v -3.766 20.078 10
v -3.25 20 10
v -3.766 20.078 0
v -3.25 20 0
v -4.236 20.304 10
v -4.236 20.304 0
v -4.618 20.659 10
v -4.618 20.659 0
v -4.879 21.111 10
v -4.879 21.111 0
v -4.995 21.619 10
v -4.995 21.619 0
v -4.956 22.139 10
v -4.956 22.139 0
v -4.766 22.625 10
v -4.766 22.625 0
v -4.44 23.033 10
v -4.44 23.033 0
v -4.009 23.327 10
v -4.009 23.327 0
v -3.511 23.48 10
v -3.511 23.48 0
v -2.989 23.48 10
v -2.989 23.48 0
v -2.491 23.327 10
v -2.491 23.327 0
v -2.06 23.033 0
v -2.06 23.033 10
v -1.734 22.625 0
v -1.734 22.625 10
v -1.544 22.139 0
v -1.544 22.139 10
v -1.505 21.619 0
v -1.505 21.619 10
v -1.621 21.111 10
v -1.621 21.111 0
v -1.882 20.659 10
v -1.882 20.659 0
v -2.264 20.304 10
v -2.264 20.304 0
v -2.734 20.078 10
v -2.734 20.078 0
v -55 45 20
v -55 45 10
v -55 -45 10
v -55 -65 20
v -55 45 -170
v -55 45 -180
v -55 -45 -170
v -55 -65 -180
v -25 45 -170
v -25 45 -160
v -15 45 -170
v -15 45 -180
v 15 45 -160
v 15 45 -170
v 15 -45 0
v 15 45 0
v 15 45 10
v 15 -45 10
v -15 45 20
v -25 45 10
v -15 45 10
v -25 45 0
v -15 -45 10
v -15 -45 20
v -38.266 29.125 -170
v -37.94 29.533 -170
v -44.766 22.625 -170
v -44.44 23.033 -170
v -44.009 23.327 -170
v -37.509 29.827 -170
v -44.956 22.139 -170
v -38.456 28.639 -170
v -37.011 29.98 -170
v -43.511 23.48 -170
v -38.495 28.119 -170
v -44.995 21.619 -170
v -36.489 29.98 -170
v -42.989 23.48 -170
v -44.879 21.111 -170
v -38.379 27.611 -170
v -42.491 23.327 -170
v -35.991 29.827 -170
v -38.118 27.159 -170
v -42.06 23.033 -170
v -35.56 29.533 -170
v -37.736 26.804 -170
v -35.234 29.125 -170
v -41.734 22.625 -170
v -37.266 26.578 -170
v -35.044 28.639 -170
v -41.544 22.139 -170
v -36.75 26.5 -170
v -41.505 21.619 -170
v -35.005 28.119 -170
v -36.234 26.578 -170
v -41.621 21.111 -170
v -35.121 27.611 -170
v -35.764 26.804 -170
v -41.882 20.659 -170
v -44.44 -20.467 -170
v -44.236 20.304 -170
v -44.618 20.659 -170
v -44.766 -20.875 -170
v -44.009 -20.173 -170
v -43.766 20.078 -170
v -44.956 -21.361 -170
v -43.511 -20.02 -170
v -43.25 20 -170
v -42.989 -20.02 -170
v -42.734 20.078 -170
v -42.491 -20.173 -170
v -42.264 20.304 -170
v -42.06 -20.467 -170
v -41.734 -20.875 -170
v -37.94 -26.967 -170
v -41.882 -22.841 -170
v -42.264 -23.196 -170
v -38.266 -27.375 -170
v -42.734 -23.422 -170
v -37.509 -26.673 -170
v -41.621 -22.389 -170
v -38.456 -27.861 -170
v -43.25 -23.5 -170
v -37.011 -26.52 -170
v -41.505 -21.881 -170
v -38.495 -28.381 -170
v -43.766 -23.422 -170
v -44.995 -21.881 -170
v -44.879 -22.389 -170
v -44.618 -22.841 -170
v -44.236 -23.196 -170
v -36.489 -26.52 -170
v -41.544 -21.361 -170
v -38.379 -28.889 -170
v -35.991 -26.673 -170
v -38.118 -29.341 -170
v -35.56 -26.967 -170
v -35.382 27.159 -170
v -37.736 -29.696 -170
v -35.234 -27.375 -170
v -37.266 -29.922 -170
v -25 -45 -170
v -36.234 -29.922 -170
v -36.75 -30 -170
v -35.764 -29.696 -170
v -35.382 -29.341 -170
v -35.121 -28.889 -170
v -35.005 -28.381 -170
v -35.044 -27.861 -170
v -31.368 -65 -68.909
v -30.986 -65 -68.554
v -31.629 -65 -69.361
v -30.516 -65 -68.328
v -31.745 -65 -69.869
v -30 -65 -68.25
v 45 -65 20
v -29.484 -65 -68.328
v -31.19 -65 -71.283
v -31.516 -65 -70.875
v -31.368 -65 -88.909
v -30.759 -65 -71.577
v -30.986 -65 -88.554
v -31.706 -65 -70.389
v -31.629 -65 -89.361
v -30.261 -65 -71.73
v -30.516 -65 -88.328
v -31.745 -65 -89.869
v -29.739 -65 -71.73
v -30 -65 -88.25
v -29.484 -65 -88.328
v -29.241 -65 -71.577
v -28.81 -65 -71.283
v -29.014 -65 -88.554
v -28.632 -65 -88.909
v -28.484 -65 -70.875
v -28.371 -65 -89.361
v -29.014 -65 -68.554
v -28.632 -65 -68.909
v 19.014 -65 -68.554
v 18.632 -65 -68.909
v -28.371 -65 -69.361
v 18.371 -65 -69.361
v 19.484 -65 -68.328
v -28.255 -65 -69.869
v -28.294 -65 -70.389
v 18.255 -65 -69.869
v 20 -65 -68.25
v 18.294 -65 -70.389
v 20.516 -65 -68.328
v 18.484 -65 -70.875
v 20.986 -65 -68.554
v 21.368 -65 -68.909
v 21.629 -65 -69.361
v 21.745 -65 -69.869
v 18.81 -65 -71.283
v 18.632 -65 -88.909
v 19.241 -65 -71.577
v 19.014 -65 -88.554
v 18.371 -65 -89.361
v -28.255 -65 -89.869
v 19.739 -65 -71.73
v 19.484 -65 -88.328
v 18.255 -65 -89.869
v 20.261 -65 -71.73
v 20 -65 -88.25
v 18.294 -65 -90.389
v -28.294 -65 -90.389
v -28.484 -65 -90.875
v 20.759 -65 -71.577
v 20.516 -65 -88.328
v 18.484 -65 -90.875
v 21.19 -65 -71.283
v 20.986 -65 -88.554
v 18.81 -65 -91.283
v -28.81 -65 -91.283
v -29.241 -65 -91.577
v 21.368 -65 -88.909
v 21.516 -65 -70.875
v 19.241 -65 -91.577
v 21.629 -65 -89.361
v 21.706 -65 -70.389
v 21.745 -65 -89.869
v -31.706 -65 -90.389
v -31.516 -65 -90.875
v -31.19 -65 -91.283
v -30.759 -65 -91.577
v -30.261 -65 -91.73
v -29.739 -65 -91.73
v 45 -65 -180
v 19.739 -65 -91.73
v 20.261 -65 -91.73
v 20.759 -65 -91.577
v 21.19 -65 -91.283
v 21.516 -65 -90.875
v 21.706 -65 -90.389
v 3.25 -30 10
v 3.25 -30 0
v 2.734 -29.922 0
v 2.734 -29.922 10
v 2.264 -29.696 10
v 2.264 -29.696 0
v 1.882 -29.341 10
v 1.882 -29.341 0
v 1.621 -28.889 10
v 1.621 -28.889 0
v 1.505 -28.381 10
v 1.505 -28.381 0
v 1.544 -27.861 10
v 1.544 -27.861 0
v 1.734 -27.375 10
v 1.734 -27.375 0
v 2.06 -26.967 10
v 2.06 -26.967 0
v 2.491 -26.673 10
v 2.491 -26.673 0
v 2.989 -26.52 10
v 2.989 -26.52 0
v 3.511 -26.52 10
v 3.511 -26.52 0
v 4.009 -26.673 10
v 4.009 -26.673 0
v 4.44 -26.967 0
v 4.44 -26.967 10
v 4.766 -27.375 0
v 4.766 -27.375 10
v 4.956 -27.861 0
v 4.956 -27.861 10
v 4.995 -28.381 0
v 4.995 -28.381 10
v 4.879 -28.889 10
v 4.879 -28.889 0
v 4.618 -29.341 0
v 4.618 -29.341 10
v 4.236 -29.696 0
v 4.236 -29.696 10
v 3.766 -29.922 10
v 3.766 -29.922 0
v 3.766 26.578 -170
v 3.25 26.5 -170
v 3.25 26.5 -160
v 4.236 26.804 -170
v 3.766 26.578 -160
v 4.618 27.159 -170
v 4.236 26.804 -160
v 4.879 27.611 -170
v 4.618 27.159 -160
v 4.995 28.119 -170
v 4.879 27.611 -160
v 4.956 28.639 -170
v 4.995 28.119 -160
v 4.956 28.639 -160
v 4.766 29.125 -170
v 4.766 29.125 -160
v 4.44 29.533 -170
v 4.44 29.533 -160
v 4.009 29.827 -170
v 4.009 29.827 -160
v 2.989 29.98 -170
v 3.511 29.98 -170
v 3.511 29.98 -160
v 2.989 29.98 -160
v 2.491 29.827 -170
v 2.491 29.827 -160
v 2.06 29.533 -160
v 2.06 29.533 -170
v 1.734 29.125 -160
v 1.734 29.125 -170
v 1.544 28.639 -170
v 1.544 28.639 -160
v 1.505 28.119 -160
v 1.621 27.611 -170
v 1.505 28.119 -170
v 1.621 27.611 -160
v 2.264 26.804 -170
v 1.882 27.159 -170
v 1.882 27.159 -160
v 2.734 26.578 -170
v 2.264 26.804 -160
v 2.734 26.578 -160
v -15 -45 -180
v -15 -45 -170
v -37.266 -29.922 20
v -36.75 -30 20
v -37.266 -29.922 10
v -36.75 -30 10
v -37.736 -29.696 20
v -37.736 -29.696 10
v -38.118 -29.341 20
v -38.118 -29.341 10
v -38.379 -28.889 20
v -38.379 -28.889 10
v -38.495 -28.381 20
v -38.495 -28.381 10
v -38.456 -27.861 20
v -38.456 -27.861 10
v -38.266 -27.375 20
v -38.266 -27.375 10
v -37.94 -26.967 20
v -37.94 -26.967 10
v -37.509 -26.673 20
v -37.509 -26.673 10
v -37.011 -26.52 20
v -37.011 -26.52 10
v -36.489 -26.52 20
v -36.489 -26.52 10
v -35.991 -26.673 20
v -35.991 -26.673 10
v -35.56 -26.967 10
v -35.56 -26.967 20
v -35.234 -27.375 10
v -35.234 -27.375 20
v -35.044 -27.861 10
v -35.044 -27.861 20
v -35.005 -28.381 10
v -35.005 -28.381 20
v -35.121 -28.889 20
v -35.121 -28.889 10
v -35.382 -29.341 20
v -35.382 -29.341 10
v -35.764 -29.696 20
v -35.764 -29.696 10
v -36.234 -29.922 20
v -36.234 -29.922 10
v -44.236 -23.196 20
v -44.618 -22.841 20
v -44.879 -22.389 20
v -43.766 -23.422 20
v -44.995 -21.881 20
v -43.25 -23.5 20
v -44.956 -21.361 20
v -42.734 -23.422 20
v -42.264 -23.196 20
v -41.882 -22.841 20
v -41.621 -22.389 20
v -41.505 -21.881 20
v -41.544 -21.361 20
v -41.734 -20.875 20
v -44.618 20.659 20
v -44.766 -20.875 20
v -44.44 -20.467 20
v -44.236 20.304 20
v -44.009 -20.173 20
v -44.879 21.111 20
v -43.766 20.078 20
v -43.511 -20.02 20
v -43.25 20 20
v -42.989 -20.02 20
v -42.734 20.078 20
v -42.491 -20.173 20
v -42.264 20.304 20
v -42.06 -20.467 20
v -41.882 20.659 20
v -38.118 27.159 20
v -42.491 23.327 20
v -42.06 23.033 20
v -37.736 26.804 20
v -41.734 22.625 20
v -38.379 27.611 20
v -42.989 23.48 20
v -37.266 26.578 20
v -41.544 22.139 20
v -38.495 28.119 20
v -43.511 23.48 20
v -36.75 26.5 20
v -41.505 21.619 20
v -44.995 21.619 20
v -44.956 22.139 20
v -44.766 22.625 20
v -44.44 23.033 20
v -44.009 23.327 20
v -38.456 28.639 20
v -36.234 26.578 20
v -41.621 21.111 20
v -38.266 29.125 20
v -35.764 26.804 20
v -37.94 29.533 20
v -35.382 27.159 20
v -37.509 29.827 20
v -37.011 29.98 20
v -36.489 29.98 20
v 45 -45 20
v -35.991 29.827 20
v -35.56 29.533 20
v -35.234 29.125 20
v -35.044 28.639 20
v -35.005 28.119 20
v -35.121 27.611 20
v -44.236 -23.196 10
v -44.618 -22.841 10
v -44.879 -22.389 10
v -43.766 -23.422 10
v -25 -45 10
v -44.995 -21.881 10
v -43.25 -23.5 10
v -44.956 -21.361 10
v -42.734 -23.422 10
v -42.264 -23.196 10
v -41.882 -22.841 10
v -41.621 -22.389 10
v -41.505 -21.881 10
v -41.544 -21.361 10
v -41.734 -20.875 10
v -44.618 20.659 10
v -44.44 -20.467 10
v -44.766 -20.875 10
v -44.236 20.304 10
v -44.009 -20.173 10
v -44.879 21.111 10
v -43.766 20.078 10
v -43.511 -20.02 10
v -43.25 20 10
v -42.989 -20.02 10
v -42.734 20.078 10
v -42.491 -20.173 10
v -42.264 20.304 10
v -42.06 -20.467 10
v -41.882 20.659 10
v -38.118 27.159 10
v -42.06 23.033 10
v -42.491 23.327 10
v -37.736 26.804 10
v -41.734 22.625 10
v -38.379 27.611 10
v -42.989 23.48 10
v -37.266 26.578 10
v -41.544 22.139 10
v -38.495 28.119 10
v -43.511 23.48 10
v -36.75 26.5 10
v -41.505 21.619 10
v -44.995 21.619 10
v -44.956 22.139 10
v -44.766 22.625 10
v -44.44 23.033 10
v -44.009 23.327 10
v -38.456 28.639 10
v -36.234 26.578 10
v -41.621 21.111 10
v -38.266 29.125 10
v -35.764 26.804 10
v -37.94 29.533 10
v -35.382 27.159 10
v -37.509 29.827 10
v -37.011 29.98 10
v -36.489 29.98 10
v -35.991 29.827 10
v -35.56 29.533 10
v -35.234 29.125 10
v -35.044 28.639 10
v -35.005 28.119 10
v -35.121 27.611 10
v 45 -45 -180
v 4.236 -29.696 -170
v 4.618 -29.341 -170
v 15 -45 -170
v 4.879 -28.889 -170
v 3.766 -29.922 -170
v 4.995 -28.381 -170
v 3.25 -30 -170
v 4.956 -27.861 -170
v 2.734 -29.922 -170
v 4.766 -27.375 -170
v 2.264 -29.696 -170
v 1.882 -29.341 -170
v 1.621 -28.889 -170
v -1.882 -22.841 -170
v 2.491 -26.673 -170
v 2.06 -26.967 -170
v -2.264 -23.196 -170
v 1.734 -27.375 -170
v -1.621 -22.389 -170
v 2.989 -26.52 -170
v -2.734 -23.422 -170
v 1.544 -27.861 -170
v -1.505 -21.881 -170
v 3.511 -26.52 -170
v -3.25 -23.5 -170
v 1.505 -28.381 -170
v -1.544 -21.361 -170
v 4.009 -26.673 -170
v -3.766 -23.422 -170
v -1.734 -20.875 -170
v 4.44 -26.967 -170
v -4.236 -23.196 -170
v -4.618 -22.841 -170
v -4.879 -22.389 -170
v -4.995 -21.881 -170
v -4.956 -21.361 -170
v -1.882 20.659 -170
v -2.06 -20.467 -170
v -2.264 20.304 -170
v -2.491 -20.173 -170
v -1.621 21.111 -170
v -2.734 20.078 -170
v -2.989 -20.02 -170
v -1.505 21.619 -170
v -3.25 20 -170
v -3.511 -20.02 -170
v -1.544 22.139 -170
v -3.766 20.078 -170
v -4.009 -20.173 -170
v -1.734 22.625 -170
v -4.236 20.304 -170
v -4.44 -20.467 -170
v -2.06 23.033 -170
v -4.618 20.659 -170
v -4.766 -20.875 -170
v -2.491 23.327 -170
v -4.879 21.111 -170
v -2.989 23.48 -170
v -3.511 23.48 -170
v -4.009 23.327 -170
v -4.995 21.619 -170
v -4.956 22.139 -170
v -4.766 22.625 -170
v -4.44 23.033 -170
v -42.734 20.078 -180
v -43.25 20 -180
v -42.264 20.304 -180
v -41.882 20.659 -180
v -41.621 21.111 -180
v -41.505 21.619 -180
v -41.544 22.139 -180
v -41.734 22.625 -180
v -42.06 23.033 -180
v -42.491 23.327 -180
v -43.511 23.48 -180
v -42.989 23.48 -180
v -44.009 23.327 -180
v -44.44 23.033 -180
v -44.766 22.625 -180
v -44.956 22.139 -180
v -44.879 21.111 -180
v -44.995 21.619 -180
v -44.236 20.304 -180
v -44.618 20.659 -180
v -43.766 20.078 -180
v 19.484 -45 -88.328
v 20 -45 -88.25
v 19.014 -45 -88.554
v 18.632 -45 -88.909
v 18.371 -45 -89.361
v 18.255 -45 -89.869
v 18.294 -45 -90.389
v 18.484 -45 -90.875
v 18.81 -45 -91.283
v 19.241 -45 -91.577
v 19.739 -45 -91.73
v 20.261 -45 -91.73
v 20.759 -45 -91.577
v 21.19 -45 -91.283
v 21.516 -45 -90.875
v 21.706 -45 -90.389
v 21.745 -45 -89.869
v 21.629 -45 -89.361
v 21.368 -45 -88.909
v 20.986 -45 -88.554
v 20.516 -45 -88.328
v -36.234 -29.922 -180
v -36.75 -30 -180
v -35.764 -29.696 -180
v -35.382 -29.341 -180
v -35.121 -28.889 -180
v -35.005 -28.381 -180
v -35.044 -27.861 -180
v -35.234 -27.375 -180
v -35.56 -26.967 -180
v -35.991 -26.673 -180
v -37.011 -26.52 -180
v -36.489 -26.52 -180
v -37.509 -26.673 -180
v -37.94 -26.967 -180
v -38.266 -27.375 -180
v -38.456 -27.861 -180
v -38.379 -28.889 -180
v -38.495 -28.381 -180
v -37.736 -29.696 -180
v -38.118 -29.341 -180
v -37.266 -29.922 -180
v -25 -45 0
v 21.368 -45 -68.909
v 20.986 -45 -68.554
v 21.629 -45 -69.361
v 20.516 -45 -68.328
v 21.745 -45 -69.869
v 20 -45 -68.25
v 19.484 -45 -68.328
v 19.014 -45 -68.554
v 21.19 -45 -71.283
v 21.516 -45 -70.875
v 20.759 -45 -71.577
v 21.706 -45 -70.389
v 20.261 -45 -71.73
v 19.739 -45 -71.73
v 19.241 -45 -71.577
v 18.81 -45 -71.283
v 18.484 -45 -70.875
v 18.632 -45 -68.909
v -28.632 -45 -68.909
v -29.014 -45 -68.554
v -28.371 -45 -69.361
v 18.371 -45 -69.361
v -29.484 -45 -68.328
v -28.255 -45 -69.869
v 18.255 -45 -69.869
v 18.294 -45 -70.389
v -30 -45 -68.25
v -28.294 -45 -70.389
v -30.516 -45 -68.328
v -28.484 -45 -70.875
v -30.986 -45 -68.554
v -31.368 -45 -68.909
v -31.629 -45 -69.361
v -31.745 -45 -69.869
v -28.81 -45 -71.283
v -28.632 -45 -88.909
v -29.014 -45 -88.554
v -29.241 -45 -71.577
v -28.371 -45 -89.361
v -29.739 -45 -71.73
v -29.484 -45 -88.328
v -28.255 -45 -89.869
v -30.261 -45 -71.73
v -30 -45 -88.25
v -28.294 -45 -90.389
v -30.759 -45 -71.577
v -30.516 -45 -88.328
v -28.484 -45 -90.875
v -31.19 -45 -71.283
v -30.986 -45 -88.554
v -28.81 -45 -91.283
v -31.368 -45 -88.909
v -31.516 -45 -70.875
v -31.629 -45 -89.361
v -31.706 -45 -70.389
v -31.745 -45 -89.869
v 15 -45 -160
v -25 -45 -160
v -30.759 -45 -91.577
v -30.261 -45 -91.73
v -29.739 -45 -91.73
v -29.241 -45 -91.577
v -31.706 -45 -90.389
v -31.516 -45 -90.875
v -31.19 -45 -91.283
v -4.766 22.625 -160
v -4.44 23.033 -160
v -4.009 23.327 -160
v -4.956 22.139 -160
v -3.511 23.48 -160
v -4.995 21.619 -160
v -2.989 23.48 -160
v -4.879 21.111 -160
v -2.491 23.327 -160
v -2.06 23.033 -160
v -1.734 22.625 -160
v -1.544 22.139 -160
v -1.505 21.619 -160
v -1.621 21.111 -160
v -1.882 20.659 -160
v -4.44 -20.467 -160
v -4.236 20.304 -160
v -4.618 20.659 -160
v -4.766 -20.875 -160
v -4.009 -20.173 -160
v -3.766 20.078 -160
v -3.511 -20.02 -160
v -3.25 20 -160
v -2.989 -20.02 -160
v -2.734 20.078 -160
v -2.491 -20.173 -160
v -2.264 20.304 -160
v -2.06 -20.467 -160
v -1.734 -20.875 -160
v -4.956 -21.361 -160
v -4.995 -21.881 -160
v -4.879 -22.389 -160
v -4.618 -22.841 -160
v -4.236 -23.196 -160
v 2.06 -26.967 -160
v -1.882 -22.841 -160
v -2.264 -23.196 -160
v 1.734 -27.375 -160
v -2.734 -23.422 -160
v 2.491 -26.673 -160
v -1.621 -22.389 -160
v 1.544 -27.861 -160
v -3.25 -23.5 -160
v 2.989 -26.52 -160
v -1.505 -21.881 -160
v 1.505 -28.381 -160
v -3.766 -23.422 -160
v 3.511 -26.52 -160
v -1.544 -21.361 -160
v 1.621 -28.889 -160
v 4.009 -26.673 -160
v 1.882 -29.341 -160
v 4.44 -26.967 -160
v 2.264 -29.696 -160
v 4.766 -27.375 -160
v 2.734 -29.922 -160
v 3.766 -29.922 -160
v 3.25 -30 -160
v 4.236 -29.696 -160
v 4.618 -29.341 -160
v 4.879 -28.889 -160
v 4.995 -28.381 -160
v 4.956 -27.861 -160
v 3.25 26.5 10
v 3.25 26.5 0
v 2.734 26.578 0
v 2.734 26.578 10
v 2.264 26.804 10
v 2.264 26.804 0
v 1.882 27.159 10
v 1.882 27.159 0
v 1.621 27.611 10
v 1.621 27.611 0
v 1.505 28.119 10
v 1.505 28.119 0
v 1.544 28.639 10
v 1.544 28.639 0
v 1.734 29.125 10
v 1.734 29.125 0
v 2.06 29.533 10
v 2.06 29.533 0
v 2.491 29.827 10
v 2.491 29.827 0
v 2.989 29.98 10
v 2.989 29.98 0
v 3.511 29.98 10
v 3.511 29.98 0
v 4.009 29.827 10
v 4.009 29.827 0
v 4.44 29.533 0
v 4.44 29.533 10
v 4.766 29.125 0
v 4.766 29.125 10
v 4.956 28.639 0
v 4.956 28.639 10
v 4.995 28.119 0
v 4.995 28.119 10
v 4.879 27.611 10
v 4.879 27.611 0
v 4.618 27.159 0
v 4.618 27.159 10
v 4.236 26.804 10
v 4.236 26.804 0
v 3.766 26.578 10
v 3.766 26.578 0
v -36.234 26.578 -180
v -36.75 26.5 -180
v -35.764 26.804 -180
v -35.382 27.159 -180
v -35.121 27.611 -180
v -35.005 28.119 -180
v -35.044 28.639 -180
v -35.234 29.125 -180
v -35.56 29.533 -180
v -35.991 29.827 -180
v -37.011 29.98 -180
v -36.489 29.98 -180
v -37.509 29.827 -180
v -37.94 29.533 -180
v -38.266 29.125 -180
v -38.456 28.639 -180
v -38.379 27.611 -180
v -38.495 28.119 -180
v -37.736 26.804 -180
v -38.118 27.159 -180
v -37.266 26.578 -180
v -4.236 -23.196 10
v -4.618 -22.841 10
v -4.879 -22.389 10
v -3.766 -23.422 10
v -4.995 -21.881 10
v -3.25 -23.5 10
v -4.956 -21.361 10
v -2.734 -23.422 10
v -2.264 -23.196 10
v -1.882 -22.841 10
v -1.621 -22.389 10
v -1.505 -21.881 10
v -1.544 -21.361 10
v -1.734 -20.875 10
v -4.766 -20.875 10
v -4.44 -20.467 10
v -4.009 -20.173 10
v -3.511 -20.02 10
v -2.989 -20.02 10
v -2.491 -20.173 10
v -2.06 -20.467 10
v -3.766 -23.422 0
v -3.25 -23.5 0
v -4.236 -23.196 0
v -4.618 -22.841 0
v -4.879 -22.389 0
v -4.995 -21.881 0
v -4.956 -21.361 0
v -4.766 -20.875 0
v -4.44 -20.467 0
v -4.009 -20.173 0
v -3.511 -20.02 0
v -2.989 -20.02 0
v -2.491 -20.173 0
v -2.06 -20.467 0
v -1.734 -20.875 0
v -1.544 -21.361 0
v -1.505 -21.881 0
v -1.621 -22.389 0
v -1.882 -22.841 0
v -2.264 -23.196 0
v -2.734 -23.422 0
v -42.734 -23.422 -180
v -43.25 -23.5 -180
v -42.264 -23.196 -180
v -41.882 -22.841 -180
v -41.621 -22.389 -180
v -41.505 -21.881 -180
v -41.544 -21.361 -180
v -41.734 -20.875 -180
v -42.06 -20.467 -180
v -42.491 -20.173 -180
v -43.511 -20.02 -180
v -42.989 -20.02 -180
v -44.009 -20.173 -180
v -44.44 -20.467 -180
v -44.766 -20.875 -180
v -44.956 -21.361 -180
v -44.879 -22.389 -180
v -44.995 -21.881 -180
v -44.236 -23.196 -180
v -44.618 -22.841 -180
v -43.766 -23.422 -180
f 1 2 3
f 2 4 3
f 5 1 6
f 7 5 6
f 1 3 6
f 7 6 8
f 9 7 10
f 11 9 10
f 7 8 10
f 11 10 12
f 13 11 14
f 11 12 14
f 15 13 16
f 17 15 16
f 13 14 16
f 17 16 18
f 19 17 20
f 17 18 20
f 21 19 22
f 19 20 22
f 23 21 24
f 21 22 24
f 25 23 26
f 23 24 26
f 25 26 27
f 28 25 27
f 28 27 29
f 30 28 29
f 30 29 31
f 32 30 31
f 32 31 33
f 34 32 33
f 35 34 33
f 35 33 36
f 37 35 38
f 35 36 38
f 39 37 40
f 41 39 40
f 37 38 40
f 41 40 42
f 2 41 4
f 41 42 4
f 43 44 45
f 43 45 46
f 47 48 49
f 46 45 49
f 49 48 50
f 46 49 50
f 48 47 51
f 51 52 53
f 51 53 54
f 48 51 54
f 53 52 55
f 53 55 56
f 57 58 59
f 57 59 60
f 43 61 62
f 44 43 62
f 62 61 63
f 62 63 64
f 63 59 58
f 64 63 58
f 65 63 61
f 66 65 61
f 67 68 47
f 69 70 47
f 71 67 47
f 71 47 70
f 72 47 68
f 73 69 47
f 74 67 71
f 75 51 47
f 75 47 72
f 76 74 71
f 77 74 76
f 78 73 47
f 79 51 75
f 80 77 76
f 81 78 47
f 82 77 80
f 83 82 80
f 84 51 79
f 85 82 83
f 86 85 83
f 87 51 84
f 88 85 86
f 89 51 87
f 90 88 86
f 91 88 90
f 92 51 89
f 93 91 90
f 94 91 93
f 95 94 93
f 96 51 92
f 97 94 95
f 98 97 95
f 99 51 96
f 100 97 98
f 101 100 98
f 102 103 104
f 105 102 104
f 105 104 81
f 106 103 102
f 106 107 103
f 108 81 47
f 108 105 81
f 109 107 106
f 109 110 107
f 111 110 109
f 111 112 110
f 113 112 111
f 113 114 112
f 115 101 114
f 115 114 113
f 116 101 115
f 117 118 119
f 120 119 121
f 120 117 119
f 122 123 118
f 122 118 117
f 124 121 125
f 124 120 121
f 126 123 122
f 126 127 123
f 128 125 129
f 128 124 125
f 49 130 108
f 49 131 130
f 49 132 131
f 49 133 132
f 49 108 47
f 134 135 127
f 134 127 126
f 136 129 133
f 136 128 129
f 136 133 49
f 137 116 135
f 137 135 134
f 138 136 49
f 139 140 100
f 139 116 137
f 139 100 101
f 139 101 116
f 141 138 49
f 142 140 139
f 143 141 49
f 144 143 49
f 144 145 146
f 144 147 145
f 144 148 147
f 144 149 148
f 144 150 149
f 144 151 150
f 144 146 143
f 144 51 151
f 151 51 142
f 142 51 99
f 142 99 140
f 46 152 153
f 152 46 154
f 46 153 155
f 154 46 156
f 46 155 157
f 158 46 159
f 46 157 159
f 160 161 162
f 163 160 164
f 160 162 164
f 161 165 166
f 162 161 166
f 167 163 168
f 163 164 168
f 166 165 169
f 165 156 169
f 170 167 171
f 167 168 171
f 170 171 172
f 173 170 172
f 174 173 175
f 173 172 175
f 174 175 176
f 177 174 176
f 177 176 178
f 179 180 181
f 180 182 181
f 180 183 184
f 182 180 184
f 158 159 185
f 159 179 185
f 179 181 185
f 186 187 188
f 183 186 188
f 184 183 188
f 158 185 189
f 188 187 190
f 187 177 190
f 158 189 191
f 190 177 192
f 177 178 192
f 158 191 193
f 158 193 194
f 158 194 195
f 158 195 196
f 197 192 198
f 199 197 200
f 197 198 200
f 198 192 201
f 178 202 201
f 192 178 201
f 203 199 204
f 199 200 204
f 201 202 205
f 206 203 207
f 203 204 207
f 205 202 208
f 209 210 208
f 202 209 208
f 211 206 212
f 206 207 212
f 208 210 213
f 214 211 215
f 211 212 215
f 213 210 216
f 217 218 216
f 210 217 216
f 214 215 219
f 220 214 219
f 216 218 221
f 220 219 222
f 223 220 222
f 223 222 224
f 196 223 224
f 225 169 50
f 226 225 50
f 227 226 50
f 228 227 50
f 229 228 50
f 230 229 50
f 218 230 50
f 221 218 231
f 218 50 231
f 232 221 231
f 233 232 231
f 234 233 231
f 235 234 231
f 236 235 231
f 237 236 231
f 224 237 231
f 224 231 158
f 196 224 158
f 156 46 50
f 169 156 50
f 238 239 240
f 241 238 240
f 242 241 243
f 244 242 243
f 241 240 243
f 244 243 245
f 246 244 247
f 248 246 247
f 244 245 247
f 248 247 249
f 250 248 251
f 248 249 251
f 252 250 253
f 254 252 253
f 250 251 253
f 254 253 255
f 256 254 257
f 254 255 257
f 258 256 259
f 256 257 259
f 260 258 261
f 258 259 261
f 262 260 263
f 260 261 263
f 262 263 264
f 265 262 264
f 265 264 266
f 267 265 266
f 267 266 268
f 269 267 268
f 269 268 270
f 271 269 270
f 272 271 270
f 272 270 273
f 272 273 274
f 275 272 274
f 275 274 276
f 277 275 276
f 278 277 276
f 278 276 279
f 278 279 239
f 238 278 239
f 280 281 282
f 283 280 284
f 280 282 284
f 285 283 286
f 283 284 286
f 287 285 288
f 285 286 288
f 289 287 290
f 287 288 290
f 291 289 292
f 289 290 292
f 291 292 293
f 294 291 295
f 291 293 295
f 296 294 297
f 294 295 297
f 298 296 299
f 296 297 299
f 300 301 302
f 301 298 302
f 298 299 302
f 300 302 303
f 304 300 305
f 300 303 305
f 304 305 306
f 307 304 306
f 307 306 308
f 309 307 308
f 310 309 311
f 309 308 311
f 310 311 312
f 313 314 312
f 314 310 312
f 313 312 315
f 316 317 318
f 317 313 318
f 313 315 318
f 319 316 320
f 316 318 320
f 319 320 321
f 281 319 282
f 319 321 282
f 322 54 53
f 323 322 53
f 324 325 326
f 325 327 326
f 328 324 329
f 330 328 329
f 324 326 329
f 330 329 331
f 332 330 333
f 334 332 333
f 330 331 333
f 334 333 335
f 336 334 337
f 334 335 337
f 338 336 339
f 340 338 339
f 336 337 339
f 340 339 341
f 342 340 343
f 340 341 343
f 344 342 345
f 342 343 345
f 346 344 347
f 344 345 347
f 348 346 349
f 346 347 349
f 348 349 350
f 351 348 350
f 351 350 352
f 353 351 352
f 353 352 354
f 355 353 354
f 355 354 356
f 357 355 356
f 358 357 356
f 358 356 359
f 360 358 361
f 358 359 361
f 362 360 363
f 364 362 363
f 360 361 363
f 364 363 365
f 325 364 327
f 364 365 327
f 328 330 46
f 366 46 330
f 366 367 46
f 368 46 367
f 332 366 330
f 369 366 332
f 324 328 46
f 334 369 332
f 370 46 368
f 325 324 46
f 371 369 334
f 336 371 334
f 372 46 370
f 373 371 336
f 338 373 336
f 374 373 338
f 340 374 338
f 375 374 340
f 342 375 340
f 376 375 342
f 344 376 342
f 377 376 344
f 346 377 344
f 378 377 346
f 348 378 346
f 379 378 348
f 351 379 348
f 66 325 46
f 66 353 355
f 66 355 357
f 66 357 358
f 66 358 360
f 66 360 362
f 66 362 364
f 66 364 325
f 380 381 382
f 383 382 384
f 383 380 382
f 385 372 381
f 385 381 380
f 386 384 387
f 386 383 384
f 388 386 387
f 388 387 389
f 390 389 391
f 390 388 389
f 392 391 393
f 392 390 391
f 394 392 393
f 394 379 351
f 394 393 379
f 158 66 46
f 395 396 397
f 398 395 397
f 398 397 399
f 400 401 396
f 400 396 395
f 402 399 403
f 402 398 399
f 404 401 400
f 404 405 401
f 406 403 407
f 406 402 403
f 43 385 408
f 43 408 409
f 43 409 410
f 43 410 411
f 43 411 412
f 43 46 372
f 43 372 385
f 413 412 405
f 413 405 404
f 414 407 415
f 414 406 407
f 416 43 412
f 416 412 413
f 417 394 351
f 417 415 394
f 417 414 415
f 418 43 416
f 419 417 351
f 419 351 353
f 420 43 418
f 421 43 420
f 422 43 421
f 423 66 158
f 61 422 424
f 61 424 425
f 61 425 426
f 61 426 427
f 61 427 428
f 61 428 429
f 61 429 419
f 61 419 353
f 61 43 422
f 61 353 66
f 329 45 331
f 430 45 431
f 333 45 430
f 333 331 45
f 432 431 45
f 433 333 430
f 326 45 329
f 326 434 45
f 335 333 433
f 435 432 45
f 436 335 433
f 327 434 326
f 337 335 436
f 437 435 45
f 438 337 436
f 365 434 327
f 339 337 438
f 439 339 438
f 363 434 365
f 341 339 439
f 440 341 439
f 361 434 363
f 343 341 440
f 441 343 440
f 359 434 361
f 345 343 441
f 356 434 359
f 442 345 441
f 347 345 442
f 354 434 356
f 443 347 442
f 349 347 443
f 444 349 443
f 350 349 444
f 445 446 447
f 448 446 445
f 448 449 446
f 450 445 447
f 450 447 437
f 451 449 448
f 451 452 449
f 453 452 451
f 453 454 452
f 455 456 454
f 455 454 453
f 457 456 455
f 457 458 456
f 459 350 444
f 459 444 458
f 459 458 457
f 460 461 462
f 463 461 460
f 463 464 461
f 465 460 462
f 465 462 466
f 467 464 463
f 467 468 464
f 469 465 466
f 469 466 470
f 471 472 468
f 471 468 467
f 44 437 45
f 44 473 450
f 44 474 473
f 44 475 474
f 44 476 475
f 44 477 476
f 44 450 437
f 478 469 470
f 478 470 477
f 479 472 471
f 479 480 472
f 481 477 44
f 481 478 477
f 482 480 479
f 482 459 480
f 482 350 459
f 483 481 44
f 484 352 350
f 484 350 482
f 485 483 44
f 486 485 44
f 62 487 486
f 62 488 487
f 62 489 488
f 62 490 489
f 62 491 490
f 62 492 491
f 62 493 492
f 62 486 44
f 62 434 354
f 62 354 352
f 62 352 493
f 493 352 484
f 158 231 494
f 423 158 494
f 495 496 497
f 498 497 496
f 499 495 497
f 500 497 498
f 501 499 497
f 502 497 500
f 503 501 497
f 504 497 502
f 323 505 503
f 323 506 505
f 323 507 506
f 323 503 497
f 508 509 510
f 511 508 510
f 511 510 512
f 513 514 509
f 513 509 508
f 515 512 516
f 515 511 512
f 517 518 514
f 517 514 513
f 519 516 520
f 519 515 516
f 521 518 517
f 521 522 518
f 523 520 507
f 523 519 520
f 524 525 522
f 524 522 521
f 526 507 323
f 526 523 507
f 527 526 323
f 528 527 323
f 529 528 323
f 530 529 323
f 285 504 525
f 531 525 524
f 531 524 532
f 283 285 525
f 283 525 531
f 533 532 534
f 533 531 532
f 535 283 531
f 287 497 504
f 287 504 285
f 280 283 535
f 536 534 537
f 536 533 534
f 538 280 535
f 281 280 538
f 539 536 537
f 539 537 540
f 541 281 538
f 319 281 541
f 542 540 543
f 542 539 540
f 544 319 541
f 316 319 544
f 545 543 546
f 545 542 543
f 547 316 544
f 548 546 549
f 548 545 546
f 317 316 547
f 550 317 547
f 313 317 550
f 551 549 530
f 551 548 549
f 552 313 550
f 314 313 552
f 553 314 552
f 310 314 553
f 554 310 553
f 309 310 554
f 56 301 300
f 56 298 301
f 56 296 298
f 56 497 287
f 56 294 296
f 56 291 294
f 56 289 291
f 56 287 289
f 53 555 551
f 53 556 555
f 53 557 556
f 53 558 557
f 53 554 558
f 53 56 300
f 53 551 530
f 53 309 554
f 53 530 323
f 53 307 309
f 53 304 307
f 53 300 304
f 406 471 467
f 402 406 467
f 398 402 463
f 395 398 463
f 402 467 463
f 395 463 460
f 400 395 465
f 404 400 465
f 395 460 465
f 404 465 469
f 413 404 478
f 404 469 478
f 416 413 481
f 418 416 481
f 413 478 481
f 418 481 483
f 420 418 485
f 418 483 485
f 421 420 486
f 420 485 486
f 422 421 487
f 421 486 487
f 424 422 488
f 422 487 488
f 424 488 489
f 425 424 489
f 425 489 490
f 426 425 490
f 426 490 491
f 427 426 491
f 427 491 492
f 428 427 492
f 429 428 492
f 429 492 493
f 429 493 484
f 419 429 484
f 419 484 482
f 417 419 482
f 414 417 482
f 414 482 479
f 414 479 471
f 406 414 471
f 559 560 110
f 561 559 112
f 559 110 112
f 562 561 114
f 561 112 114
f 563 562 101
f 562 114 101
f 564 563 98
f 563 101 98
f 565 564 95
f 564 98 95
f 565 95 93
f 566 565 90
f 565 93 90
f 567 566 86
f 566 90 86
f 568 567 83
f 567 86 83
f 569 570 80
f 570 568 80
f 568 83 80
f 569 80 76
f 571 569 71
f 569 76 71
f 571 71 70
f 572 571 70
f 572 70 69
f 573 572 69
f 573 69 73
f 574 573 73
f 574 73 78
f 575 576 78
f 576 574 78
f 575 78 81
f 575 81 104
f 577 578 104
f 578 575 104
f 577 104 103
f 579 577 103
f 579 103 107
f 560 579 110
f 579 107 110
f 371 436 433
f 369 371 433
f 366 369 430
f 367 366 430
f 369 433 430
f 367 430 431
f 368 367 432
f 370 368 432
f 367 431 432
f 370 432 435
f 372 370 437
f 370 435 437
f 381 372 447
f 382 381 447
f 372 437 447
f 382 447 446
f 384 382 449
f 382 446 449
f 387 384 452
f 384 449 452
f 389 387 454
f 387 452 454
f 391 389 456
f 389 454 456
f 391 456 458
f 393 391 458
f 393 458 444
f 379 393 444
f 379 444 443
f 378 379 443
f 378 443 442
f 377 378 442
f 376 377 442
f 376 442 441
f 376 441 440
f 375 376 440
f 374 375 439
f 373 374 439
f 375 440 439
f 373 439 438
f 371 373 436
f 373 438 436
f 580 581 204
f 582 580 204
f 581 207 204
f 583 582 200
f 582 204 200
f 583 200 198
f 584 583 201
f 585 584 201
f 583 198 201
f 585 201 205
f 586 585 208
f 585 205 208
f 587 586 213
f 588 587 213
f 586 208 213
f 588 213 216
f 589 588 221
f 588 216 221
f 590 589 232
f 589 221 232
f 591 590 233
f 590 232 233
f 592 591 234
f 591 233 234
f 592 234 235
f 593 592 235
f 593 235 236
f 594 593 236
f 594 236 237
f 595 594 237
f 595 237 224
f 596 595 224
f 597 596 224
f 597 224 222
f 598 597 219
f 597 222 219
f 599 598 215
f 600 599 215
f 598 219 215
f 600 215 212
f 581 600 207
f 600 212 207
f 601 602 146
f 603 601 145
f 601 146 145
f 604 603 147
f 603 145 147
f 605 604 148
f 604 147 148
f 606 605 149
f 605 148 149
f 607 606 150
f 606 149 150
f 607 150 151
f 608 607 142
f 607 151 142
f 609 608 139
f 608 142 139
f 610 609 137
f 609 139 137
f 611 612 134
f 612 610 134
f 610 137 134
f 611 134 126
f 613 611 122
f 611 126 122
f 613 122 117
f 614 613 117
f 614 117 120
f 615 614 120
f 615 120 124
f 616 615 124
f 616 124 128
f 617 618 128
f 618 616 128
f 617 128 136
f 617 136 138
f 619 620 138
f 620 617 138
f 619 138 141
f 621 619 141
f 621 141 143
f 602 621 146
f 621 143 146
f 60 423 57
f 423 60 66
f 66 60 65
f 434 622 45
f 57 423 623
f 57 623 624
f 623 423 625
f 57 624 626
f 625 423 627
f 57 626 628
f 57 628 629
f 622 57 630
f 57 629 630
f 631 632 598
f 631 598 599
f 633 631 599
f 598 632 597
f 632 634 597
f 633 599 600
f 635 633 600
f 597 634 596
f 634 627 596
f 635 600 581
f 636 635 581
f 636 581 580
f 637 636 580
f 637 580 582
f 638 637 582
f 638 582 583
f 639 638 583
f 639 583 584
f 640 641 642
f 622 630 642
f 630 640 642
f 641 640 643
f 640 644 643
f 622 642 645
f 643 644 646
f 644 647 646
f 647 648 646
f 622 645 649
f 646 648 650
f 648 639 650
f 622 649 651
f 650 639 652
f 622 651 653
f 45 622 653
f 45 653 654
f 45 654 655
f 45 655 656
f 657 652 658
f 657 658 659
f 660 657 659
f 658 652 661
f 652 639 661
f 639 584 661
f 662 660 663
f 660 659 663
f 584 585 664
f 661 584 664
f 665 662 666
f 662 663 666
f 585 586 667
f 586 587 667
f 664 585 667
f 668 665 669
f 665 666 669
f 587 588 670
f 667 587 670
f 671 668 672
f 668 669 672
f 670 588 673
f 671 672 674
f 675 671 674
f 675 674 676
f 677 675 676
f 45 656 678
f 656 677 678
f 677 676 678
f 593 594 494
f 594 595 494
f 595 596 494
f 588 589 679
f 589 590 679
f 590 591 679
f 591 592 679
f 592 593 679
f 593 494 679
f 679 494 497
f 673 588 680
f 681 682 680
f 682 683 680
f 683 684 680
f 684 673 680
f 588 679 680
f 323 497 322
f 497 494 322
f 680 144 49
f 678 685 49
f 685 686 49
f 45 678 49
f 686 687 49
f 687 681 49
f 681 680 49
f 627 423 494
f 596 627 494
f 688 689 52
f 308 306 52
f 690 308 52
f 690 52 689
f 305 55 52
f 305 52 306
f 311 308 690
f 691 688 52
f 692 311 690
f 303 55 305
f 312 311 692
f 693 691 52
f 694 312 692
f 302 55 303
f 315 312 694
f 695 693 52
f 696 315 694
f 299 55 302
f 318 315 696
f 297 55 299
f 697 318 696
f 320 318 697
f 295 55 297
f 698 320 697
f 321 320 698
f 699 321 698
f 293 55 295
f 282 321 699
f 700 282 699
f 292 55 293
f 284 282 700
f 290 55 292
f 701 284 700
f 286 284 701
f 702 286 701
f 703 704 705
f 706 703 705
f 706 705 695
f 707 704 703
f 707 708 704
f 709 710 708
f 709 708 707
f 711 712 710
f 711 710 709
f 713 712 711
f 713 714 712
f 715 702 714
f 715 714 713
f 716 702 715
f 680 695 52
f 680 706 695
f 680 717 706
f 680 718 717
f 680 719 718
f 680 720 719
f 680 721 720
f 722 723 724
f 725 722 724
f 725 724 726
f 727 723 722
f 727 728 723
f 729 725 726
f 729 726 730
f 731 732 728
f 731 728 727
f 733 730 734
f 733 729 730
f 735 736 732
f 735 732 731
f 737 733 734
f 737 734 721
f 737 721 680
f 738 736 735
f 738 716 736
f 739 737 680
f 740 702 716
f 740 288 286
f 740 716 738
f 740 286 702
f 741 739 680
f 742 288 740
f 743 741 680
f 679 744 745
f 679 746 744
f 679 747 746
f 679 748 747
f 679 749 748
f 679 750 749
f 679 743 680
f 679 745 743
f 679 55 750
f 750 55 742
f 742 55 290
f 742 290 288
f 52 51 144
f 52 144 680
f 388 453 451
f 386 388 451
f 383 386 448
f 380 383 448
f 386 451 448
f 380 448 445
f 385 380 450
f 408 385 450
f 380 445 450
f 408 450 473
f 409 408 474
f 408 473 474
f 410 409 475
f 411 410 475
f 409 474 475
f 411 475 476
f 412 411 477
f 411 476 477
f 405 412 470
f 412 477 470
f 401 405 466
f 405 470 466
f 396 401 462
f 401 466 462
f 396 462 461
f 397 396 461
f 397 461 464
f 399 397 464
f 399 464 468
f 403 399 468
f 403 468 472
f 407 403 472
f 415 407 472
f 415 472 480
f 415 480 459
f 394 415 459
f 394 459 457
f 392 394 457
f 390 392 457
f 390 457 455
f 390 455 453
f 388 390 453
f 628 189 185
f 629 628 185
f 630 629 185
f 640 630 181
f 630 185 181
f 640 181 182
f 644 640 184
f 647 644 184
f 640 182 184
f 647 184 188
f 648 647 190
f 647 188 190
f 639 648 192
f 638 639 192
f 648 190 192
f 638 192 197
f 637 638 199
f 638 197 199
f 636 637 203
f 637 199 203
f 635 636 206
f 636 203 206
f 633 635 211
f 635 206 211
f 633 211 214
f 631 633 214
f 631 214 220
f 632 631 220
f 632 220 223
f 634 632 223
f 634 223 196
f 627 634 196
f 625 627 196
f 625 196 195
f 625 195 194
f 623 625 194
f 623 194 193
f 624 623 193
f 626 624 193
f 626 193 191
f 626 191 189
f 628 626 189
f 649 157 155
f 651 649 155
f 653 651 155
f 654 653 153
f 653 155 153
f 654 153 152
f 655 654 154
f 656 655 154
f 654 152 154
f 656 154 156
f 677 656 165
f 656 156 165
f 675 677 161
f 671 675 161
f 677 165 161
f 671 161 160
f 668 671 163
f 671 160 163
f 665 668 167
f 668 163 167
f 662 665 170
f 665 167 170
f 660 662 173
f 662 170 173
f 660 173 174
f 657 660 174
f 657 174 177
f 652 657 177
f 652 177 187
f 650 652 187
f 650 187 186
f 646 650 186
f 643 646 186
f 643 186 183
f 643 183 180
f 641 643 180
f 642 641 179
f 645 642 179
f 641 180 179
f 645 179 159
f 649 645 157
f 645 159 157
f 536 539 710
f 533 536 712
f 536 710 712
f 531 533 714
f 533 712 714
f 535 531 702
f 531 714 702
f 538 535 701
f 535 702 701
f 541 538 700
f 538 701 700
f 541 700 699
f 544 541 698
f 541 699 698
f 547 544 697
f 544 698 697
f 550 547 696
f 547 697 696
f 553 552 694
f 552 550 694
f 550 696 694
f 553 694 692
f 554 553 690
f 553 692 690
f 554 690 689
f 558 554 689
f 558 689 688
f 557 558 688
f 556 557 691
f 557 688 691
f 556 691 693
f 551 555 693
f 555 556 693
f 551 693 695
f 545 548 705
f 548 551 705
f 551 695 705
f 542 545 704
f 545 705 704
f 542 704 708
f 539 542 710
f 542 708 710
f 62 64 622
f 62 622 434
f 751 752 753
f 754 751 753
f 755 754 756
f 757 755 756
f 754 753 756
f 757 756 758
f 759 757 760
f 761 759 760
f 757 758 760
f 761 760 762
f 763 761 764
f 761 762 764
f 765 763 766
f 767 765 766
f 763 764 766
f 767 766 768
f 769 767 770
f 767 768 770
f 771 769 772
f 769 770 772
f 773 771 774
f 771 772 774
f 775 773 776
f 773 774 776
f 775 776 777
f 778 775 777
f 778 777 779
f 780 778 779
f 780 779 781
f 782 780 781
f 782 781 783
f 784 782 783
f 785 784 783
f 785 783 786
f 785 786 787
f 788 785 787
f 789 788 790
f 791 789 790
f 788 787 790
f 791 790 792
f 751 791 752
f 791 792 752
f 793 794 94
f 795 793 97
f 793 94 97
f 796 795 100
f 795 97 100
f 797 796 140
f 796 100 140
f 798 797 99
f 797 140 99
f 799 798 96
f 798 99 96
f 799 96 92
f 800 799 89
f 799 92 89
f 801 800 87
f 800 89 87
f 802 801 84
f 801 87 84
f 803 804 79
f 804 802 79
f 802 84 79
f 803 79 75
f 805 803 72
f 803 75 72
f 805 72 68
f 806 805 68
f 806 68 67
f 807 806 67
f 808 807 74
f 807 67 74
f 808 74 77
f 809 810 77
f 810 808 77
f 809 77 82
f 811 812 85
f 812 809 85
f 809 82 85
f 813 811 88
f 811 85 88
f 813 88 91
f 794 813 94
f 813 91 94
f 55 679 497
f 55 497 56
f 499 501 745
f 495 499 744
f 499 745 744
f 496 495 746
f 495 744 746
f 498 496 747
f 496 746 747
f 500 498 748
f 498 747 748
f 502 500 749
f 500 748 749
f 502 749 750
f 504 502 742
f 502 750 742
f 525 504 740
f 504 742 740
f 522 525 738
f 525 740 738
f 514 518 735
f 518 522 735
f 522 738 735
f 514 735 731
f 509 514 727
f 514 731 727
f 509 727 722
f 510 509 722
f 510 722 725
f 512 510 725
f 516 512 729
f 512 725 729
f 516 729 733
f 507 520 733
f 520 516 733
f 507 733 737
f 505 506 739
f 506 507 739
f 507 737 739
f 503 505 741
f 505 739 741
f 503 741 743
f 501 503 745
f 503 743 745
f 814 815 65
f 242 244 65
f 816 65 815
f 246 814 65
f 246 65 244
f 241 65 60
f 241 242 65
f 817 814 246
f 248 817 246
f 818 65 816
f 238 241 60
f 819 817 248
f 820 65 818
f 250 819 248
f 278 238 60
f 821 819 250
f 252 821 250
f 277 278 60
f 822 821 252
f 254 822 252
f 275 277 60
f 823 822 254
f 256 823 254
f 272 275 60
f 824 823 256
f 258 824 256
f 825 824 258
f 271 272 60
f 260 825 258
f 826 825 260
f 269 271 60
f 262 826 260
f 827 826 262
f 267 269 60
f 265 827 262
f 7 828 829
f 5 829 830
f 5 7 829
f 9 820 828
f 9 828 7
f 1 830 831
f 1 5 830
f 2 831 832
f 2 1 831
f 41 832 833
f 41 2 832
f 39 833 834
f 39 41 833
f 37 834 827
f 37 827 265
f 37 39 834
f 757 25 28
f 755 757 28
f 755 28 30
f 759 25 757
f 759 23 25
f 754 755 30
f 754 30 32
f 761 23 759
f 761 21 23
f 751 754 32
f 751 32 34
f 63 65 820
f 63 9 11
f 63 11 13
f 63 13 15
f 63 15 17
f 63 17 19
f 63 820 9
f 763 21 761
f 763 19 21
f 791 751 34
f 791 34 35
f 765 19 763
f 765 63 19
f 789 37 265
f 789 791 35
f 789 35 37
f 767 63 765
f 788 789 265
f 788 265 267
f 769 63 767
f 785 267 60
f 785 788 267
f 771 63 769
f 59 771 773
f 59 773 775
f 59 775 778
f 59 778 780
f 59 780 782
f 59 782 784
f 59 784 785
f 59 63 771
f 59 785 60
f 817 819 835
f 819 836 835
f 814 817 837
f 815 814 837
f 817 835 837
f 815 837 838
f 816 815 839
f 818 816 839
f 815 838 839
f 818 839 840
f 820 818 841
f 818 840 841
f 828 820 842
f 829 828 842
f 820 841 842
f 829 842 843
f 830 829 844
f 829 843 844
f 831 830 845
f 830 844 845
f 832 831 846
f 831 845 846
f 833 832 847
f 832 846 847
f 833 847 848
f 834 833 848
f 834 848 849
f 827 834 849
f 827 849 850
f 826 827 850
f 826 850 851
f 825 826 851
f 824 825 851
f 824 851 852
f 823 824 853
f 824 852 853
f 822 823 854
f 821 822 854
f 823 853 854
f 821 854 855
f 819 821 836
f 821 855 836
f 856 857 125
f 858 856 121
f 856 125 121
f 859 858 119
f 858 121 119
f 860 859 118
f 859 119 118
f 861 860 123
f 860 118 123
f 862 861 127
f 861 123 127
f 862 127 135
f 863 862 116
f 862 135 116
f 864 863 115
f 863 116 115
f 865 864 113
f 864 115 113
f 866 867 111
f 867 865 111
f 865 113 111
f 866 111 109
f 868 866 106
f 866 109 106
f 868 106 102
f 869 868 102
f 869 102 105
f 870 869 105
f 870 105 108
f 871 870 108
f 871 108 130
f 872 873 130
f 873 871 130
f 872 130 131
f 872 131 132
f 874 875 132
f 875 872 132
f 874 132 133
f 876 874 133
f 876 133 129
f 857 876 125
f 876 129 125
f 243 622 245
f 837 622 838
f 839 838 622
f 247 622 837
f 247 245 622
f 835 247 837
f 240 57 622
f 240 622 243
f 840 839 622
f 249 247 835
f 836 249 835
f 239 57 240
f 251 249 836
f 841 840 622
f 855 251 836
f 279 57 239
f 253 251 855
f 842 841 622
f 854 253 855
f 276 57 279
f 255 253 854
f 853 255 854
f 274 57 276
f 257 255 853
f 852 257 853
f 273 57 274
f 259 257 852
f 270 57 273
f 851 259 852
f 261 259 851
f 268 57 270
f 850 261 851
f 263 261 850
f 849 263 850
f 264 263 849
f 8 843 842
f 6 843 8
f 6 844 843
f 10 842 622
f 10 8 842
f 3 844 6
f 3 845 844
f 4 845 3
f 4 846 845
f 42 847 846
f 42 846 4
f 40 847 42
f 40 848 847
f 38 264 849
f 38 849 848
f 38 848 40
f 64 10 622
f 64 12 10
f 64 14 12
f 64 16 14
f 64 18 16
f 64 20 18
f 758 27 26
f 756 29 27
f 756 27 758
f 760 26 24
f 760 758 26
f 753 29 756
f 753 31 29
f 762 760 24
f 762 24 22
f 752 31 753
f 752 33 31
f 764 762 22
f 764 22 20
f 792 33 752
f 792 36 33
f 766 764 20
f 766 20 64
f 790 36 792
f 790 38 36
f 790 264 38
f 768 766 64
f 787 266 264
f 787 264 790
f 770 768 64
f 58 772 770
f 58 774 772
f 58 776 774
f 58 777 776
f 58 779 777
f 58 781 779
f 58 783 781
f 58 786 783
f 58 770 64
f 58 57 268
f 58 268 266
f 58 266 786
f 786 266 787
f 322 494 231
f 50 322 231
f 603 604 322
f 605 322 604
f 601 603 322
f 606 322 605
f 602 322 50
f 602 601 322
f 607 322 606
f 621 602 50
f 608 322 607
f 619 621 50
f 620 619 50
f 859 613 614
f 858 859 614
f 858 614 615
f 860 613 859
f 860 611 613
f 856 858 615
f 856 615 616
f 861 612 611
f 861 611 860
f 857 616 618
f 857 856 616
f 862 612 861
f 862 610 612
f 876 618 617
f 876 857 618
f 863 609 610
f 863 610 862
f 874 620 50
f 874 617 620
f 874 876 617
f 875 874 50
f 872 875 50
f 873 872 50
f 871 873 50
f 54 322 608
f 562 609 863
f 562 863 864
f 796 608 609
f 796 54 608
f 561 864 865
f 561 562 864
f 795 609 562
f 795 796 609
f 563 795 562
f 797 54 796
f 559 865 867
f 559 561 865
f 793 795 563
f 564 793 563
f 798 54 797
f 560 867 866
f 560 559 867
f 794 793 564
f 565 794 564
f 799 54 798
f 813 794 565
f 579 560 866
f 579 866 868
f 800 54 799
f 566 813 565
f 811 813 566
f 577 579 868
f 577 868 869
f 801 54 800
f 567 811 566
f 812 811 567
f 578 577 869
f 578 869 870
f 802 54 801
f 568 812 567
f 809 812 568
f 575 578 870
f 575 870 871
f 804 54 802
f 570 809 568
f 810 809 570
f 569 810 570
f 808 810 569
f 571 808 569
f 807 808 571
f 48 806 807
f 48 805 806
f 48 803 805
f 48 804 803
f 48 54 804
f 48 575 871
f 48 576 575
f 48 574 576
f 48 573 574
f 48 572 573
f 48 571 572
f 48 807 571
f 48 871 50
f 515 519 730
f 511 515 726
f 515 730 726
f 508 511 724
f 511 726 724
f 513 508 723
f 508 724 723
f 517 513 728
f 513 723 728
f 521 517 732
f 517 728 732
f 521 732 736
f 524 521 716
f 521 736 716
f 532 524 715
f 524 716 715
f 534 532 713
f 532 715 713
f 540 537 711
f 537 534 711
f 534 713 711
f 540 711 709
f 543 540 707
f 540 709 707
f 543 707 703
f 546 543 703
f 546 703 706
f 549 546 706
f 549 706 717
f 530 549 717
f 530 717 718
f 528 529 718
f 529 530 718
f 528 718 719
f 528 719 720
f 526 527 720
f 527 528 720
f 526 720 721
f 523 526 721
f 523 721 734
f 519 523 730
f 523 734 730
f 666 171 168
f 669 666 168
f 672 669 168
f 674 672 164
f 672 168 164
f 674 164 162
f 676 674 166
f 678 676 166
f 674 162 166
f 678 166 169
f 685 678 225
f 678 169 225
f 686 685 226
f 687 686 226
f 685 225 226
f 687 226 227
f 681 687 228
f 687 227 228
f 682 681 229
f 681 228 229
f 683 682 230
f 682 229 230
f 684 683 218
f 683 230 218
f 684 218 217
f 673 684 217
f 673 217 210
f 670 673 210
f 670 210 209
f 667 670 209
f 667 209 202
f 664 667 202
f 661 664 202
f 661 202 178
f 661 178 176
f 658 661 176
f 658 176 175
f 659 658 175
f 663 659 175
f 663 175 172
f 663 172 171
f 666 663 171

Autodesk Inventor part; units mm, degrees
ref_plane "YZ Plane" through (0, 0, 0) normal (1, 0, 0) x (0, 1, 0)
ref_plane "XZ Plane" through (0, 0, 0) normal (0, 1, 0) x (-1, 0, 0)
ref_plane "XY Plane" through (0, 0, 0) normal (0, 0, 1) x (1, 0, 0)
sketch "Boceto1" plane through (0, 0, 0) normal (0, 0, 1) x (1, 0, 0)
  line L0 (-15, 45) -> (15, 45)
  line L1 (15, 45) -> (15, -45)
  line L2 (15, -45) -> (-15, -45)
  line L3 (-15, -45) -> (-15, 45)
  line L4 (-15, 45) -> (15, -45) construction
  line L5 (15, 45) -> (-15, -45) construction
  point P0 (0, 0)
  dimension "d0" = 30
  dimension "d1" = 90
extrude "Extrusión1" add sketch "Boceto1" along normal blind 10
sketch "Boceto2" plane through (0, 0, 10) normal (0, 0, 1) x (1, 0, 0)
  line L0 (15, 45) -> (15, -45)
  line L1 (5, 30) -> (5, 20)
  line L2 (-5, 30) -> (5, 30)
  line L3 (5, 20) -> (-5, 30) construction
  line L4 (5, 20) -> (-5, 20)
  line L5 (-5, 20) -> (5, 30) construction
  line L6 (-5, 20) -> (-5, 30)
  line L7 (24, 0) -> (9, 0)
  line L8 (-15, -45) -> (15, -45)
  line L9 (5, 25) -> (5.4102, 25)
  circle A0 centre (-3.25, 21.75) radius 1.75
  circle A1 centre (3.25, 28.25) radius 1.75
  line L10 (5, -20) -> (-5, -20)
  circle A2 centre (-3.25, -21.75) radius 1.75
  line L11 (5, -25) -> (5.4102, -25)
  line L12 (5, -30) -> (5, -20)
  line L13 (-5, -30) -> (5, -30)
  line L14 (5, -20) -> (-5, -30) construction
  line L15 (-5, -20) -> (5, -30) construction
  line L16 (-5, -20) -> (-5, -30)
  circle A3 centre (3.25, -28.25) radius 1.75
  line L17 (-15, -45) -> (-15, 45)
  line L18 (15, -45) -> (15, 45) projected
  line L19 (-15, -45) -> (15, -45) projected
  line L20 (-15, 45) -> (15, 45)
  line L21 (-3.25, 28.25) -> (3.25, 21.75)
  line L22 (-3.25, 21.75) -> (3.25, 28.25)
  point P0 (0, 0)
  point P1 (-113, 215)
  point P2 (-5, 25)
  point P3 (-3.25, -21.75)
  point P4 (3.25, -28.25)
  point P5 (-143, 115)
  point P6 (-3.25, -21.75)
  point P7 (-5, -25)
  point P8 (3.25, -28.25)
  point P9 (0, 25)
  point P10 (0, -25)
  dimension "d4" = 1.75
  dimension "d5" = 1.75
  dimension "d6" = 1.75
  dimension "d7" = 1.75
  dimension "d8" = 10
  dimension "d9" = 10
  dimension "d10" = 10
  dimension "d11" = 15
  dimension "d12" = 0
  dimension "d13" = 30
  dimension "d14" = 0
  dimension "d15" = 90
  dimension "d16" = 15
hole "Agujero1" at (3.25, 28.25, 10) at (-3.25, 21.75, 10) at (-3.25, -21.75, 10) at (3.25, -28.25, 10) direction (0, 0, -1) diameter 3.5 end through all
sketch "Boceto3" plane through (-15, -45, 0) normal (-1, 0, 0) x (0, 0, 1)
  line L0 (0, 0) -> (0, 90) projected
  line L1 (0, 90) -> (20, 90)
  line L2 (20, 90) -> (20, 0)
  line L3 (20, 0) -> (0, 0)
  line L4 (0, 0) -> (0, 90)
  point P0 (0, 45)
  dimension "d24" = 20
  dimension "d25" = 90
extrude "Extrusión2" add sketch "Boceto3" along normal blind 10
sketch "Boceto4" plane through (-25, -45, 0) normal (-1, 0, 0) x (0, 0, 1)
  line L0 (20, 90) -> (10, 90) projected
  line L1 (10, 0) -> (10, 90) projected
  line L2 (20, 90) -> (10, 90)
  line L3 (10, 90) -> (10, 0)
  line L4 (10, 0) -> (20, 0)
  line L5 (20, 0) -> (20, 90)
  point P0 (0, 45)
extrude "Extrusión3" add sketch "Boceto4" along normal blind 30
sketch "Boceto5" plane through (-15, -45, 20) normal (0, 0, 1) x (1, 0, 0)
  line L0 (-40, 0) -> (-70, 90)
  line L1 (-70, 90) -> (-40, 0)
  line L2 (-20, 75) -> (-20, 65)
  line L3 (-30, 75) -> (-20, 75)
  line L4 (-20, 65) -> (-30, 75) construction
  line L5 (-20, 65) -> (-30, 65)
  line L6 (-30, 65) -> (-20, 75) construction
  circle A0 centre (-28.25, 66.75) radius 1.75
  line L7 (-30, 65) -> (-30, 75)
  circle A1 centre (-21.75, 73.25) radius 1.75
  line L8 (-40, -20) -> (-40, 90)
  line L9 (-55, 45) -> (-143, 45)
  line L10 (-20, 25) -> (-30, 25)
  circle A2 centre (-28.25, 23.25) radius 1.75
  line L11 (-20, 15) -> (-20, 25)
  line L12 (-20, 25) -> (-30, 15) construction
  line L13 (-30, 25) -> (-20, 15) construction
  line L14 (-30, 25) -> (-30, 15)
  line L15 (-30, 15) -> (-20, 15)
  circle A3 centre (-21.75, 16.75) radius 1.75
  line L16 (-70, 0) -> (-40, 0)
  line L17 (0, 0) -> (-40, 0) projected
  line L18 (-40, 90) -> (-70, 90)
  line L19 (-40, 0) -> (-40, 90) projected
  point P0 (15, 45)
  point P1 (-30, 70)
  point P2 (-20, 70)
  point P3 (-20, 20)
  point P4 (-30, 20)
  point P5 (-55, 0)
  point P6 (-55, 90)
  dimension "d30" = 3.5
  dimension "d31" = 1.75
  dimension "d32" = 1.75
  dimension "d33" = 1.75
  dimension "d34" = 1.75
  dimension "d35" = 10
  dimension "d36" = 10
  dimension "d38" = 10
  dimension "d39" = -41.1096
  dimension "d40" = 15
  dimension "d41" = 0
  dimension "d42" = 15
  dimension "d43" = 90
  dimension "d45" = 0
hole "Agujero2" at (-36.75, 28.25, 20) at (-43.25, 21.75, 20) at (-43.25, -21.75, 20) at (-36.75, -28.25, 20) direction (0, 0, -1) diameter 3.5 end through all
sketch "Boceto6" plane through (-15, -45, 20) normal (0, 0, 1) x (1, 0, 0)
  line L0 (-10, 0) -> (-40, 0) projected
  line L1 (-40, 0) -> (60, 0)
  line L2 (60, 0) -> (60, -20)
  line L3 (60, -20) -> (-40, -20)
  line L4 (-40, -20) -> (-40, 0)
  point P0 (15, 45)
  dimension "d53" = 20
extrude "Extrusión4" add sketch "Boceto6" against normal blind 100
mirror "Simetría1" about plane through (-5, -55, -80) normal (0, 0, -1) of "Extrusión1", "Agujero1", "Extrusión2", "Agujero2", "Extrusión3", "Extrusión4"
ref_plane "Plano de trabajo2" through (45, -65, -80) normal (0, 0, -1) x (-1, 0, 0)
sketch "Boceto7" plane through (-15, -45, 20) normal (0, 1, 0) x (1, 0, 0)
  line L0 (30, 115) -> (30, 85)
  circle A0 centre (35, 90) radius 1.75
  line L1 (30, 85) -> (40, 85)
  line L2 (35, 110) -> (35, 90)
  circle A1 centre (35, 110) radius 1.75
  line L3 (40, 115) -> (30, 85) construction
  line L4 (40, 115) -> (30, 115)
  line L5 (30, 115) -> (40, 85) construction
  line L6 (40, 85) -> (40, 115)
  line L7 (60, 0) -> (60, 200) projected
  line L8 (-40, 0) -> (60, 0) projected
  line L9 (10, 0) -> (10, 134.4524)
  line L10 (-10, 115) -> (-10, 85)
  circle A2 centre (-15, 110) radius 1.75
  line L11 (-20, 115) -> (-10, 115)
  circle A3 centre (-15, 90) radius 1.75
  line L12 (-10, 85) -> (-20, 85)
  line L13 (-20, 115) -> (-10, 85) construction
  line L14 (-10, 115) -> (-20, 85) construction
  line L15 (-20, 85) -> (-20, 115)
  line L16 (-15, 110) -> (-15, 90)
  point P0 (15, 20)
  point P1 (189.1833, 40)
  point P2 (35, 115)
  point P3 (-85.8367, 100)
  point P4 (235.02, 100)
  point P5 (-15, 115)
  dimension "d56" = 5
  dimension "d57" = 5
  dimension "d58" = 3.5
  dimension "d59" = 5
  dimension "d60" = 5
  dimension "d61" = 10
  dimension "d62" = 30
  dimension "d64" = 20
hole "Agujero3" at (-30, -45, -90) at (-30, -45, -70) at (20, -45, -90) at (20, -45, -70) direction (0, -1, 0) diameter 3.5 end through all
properties part number "container_mid"
